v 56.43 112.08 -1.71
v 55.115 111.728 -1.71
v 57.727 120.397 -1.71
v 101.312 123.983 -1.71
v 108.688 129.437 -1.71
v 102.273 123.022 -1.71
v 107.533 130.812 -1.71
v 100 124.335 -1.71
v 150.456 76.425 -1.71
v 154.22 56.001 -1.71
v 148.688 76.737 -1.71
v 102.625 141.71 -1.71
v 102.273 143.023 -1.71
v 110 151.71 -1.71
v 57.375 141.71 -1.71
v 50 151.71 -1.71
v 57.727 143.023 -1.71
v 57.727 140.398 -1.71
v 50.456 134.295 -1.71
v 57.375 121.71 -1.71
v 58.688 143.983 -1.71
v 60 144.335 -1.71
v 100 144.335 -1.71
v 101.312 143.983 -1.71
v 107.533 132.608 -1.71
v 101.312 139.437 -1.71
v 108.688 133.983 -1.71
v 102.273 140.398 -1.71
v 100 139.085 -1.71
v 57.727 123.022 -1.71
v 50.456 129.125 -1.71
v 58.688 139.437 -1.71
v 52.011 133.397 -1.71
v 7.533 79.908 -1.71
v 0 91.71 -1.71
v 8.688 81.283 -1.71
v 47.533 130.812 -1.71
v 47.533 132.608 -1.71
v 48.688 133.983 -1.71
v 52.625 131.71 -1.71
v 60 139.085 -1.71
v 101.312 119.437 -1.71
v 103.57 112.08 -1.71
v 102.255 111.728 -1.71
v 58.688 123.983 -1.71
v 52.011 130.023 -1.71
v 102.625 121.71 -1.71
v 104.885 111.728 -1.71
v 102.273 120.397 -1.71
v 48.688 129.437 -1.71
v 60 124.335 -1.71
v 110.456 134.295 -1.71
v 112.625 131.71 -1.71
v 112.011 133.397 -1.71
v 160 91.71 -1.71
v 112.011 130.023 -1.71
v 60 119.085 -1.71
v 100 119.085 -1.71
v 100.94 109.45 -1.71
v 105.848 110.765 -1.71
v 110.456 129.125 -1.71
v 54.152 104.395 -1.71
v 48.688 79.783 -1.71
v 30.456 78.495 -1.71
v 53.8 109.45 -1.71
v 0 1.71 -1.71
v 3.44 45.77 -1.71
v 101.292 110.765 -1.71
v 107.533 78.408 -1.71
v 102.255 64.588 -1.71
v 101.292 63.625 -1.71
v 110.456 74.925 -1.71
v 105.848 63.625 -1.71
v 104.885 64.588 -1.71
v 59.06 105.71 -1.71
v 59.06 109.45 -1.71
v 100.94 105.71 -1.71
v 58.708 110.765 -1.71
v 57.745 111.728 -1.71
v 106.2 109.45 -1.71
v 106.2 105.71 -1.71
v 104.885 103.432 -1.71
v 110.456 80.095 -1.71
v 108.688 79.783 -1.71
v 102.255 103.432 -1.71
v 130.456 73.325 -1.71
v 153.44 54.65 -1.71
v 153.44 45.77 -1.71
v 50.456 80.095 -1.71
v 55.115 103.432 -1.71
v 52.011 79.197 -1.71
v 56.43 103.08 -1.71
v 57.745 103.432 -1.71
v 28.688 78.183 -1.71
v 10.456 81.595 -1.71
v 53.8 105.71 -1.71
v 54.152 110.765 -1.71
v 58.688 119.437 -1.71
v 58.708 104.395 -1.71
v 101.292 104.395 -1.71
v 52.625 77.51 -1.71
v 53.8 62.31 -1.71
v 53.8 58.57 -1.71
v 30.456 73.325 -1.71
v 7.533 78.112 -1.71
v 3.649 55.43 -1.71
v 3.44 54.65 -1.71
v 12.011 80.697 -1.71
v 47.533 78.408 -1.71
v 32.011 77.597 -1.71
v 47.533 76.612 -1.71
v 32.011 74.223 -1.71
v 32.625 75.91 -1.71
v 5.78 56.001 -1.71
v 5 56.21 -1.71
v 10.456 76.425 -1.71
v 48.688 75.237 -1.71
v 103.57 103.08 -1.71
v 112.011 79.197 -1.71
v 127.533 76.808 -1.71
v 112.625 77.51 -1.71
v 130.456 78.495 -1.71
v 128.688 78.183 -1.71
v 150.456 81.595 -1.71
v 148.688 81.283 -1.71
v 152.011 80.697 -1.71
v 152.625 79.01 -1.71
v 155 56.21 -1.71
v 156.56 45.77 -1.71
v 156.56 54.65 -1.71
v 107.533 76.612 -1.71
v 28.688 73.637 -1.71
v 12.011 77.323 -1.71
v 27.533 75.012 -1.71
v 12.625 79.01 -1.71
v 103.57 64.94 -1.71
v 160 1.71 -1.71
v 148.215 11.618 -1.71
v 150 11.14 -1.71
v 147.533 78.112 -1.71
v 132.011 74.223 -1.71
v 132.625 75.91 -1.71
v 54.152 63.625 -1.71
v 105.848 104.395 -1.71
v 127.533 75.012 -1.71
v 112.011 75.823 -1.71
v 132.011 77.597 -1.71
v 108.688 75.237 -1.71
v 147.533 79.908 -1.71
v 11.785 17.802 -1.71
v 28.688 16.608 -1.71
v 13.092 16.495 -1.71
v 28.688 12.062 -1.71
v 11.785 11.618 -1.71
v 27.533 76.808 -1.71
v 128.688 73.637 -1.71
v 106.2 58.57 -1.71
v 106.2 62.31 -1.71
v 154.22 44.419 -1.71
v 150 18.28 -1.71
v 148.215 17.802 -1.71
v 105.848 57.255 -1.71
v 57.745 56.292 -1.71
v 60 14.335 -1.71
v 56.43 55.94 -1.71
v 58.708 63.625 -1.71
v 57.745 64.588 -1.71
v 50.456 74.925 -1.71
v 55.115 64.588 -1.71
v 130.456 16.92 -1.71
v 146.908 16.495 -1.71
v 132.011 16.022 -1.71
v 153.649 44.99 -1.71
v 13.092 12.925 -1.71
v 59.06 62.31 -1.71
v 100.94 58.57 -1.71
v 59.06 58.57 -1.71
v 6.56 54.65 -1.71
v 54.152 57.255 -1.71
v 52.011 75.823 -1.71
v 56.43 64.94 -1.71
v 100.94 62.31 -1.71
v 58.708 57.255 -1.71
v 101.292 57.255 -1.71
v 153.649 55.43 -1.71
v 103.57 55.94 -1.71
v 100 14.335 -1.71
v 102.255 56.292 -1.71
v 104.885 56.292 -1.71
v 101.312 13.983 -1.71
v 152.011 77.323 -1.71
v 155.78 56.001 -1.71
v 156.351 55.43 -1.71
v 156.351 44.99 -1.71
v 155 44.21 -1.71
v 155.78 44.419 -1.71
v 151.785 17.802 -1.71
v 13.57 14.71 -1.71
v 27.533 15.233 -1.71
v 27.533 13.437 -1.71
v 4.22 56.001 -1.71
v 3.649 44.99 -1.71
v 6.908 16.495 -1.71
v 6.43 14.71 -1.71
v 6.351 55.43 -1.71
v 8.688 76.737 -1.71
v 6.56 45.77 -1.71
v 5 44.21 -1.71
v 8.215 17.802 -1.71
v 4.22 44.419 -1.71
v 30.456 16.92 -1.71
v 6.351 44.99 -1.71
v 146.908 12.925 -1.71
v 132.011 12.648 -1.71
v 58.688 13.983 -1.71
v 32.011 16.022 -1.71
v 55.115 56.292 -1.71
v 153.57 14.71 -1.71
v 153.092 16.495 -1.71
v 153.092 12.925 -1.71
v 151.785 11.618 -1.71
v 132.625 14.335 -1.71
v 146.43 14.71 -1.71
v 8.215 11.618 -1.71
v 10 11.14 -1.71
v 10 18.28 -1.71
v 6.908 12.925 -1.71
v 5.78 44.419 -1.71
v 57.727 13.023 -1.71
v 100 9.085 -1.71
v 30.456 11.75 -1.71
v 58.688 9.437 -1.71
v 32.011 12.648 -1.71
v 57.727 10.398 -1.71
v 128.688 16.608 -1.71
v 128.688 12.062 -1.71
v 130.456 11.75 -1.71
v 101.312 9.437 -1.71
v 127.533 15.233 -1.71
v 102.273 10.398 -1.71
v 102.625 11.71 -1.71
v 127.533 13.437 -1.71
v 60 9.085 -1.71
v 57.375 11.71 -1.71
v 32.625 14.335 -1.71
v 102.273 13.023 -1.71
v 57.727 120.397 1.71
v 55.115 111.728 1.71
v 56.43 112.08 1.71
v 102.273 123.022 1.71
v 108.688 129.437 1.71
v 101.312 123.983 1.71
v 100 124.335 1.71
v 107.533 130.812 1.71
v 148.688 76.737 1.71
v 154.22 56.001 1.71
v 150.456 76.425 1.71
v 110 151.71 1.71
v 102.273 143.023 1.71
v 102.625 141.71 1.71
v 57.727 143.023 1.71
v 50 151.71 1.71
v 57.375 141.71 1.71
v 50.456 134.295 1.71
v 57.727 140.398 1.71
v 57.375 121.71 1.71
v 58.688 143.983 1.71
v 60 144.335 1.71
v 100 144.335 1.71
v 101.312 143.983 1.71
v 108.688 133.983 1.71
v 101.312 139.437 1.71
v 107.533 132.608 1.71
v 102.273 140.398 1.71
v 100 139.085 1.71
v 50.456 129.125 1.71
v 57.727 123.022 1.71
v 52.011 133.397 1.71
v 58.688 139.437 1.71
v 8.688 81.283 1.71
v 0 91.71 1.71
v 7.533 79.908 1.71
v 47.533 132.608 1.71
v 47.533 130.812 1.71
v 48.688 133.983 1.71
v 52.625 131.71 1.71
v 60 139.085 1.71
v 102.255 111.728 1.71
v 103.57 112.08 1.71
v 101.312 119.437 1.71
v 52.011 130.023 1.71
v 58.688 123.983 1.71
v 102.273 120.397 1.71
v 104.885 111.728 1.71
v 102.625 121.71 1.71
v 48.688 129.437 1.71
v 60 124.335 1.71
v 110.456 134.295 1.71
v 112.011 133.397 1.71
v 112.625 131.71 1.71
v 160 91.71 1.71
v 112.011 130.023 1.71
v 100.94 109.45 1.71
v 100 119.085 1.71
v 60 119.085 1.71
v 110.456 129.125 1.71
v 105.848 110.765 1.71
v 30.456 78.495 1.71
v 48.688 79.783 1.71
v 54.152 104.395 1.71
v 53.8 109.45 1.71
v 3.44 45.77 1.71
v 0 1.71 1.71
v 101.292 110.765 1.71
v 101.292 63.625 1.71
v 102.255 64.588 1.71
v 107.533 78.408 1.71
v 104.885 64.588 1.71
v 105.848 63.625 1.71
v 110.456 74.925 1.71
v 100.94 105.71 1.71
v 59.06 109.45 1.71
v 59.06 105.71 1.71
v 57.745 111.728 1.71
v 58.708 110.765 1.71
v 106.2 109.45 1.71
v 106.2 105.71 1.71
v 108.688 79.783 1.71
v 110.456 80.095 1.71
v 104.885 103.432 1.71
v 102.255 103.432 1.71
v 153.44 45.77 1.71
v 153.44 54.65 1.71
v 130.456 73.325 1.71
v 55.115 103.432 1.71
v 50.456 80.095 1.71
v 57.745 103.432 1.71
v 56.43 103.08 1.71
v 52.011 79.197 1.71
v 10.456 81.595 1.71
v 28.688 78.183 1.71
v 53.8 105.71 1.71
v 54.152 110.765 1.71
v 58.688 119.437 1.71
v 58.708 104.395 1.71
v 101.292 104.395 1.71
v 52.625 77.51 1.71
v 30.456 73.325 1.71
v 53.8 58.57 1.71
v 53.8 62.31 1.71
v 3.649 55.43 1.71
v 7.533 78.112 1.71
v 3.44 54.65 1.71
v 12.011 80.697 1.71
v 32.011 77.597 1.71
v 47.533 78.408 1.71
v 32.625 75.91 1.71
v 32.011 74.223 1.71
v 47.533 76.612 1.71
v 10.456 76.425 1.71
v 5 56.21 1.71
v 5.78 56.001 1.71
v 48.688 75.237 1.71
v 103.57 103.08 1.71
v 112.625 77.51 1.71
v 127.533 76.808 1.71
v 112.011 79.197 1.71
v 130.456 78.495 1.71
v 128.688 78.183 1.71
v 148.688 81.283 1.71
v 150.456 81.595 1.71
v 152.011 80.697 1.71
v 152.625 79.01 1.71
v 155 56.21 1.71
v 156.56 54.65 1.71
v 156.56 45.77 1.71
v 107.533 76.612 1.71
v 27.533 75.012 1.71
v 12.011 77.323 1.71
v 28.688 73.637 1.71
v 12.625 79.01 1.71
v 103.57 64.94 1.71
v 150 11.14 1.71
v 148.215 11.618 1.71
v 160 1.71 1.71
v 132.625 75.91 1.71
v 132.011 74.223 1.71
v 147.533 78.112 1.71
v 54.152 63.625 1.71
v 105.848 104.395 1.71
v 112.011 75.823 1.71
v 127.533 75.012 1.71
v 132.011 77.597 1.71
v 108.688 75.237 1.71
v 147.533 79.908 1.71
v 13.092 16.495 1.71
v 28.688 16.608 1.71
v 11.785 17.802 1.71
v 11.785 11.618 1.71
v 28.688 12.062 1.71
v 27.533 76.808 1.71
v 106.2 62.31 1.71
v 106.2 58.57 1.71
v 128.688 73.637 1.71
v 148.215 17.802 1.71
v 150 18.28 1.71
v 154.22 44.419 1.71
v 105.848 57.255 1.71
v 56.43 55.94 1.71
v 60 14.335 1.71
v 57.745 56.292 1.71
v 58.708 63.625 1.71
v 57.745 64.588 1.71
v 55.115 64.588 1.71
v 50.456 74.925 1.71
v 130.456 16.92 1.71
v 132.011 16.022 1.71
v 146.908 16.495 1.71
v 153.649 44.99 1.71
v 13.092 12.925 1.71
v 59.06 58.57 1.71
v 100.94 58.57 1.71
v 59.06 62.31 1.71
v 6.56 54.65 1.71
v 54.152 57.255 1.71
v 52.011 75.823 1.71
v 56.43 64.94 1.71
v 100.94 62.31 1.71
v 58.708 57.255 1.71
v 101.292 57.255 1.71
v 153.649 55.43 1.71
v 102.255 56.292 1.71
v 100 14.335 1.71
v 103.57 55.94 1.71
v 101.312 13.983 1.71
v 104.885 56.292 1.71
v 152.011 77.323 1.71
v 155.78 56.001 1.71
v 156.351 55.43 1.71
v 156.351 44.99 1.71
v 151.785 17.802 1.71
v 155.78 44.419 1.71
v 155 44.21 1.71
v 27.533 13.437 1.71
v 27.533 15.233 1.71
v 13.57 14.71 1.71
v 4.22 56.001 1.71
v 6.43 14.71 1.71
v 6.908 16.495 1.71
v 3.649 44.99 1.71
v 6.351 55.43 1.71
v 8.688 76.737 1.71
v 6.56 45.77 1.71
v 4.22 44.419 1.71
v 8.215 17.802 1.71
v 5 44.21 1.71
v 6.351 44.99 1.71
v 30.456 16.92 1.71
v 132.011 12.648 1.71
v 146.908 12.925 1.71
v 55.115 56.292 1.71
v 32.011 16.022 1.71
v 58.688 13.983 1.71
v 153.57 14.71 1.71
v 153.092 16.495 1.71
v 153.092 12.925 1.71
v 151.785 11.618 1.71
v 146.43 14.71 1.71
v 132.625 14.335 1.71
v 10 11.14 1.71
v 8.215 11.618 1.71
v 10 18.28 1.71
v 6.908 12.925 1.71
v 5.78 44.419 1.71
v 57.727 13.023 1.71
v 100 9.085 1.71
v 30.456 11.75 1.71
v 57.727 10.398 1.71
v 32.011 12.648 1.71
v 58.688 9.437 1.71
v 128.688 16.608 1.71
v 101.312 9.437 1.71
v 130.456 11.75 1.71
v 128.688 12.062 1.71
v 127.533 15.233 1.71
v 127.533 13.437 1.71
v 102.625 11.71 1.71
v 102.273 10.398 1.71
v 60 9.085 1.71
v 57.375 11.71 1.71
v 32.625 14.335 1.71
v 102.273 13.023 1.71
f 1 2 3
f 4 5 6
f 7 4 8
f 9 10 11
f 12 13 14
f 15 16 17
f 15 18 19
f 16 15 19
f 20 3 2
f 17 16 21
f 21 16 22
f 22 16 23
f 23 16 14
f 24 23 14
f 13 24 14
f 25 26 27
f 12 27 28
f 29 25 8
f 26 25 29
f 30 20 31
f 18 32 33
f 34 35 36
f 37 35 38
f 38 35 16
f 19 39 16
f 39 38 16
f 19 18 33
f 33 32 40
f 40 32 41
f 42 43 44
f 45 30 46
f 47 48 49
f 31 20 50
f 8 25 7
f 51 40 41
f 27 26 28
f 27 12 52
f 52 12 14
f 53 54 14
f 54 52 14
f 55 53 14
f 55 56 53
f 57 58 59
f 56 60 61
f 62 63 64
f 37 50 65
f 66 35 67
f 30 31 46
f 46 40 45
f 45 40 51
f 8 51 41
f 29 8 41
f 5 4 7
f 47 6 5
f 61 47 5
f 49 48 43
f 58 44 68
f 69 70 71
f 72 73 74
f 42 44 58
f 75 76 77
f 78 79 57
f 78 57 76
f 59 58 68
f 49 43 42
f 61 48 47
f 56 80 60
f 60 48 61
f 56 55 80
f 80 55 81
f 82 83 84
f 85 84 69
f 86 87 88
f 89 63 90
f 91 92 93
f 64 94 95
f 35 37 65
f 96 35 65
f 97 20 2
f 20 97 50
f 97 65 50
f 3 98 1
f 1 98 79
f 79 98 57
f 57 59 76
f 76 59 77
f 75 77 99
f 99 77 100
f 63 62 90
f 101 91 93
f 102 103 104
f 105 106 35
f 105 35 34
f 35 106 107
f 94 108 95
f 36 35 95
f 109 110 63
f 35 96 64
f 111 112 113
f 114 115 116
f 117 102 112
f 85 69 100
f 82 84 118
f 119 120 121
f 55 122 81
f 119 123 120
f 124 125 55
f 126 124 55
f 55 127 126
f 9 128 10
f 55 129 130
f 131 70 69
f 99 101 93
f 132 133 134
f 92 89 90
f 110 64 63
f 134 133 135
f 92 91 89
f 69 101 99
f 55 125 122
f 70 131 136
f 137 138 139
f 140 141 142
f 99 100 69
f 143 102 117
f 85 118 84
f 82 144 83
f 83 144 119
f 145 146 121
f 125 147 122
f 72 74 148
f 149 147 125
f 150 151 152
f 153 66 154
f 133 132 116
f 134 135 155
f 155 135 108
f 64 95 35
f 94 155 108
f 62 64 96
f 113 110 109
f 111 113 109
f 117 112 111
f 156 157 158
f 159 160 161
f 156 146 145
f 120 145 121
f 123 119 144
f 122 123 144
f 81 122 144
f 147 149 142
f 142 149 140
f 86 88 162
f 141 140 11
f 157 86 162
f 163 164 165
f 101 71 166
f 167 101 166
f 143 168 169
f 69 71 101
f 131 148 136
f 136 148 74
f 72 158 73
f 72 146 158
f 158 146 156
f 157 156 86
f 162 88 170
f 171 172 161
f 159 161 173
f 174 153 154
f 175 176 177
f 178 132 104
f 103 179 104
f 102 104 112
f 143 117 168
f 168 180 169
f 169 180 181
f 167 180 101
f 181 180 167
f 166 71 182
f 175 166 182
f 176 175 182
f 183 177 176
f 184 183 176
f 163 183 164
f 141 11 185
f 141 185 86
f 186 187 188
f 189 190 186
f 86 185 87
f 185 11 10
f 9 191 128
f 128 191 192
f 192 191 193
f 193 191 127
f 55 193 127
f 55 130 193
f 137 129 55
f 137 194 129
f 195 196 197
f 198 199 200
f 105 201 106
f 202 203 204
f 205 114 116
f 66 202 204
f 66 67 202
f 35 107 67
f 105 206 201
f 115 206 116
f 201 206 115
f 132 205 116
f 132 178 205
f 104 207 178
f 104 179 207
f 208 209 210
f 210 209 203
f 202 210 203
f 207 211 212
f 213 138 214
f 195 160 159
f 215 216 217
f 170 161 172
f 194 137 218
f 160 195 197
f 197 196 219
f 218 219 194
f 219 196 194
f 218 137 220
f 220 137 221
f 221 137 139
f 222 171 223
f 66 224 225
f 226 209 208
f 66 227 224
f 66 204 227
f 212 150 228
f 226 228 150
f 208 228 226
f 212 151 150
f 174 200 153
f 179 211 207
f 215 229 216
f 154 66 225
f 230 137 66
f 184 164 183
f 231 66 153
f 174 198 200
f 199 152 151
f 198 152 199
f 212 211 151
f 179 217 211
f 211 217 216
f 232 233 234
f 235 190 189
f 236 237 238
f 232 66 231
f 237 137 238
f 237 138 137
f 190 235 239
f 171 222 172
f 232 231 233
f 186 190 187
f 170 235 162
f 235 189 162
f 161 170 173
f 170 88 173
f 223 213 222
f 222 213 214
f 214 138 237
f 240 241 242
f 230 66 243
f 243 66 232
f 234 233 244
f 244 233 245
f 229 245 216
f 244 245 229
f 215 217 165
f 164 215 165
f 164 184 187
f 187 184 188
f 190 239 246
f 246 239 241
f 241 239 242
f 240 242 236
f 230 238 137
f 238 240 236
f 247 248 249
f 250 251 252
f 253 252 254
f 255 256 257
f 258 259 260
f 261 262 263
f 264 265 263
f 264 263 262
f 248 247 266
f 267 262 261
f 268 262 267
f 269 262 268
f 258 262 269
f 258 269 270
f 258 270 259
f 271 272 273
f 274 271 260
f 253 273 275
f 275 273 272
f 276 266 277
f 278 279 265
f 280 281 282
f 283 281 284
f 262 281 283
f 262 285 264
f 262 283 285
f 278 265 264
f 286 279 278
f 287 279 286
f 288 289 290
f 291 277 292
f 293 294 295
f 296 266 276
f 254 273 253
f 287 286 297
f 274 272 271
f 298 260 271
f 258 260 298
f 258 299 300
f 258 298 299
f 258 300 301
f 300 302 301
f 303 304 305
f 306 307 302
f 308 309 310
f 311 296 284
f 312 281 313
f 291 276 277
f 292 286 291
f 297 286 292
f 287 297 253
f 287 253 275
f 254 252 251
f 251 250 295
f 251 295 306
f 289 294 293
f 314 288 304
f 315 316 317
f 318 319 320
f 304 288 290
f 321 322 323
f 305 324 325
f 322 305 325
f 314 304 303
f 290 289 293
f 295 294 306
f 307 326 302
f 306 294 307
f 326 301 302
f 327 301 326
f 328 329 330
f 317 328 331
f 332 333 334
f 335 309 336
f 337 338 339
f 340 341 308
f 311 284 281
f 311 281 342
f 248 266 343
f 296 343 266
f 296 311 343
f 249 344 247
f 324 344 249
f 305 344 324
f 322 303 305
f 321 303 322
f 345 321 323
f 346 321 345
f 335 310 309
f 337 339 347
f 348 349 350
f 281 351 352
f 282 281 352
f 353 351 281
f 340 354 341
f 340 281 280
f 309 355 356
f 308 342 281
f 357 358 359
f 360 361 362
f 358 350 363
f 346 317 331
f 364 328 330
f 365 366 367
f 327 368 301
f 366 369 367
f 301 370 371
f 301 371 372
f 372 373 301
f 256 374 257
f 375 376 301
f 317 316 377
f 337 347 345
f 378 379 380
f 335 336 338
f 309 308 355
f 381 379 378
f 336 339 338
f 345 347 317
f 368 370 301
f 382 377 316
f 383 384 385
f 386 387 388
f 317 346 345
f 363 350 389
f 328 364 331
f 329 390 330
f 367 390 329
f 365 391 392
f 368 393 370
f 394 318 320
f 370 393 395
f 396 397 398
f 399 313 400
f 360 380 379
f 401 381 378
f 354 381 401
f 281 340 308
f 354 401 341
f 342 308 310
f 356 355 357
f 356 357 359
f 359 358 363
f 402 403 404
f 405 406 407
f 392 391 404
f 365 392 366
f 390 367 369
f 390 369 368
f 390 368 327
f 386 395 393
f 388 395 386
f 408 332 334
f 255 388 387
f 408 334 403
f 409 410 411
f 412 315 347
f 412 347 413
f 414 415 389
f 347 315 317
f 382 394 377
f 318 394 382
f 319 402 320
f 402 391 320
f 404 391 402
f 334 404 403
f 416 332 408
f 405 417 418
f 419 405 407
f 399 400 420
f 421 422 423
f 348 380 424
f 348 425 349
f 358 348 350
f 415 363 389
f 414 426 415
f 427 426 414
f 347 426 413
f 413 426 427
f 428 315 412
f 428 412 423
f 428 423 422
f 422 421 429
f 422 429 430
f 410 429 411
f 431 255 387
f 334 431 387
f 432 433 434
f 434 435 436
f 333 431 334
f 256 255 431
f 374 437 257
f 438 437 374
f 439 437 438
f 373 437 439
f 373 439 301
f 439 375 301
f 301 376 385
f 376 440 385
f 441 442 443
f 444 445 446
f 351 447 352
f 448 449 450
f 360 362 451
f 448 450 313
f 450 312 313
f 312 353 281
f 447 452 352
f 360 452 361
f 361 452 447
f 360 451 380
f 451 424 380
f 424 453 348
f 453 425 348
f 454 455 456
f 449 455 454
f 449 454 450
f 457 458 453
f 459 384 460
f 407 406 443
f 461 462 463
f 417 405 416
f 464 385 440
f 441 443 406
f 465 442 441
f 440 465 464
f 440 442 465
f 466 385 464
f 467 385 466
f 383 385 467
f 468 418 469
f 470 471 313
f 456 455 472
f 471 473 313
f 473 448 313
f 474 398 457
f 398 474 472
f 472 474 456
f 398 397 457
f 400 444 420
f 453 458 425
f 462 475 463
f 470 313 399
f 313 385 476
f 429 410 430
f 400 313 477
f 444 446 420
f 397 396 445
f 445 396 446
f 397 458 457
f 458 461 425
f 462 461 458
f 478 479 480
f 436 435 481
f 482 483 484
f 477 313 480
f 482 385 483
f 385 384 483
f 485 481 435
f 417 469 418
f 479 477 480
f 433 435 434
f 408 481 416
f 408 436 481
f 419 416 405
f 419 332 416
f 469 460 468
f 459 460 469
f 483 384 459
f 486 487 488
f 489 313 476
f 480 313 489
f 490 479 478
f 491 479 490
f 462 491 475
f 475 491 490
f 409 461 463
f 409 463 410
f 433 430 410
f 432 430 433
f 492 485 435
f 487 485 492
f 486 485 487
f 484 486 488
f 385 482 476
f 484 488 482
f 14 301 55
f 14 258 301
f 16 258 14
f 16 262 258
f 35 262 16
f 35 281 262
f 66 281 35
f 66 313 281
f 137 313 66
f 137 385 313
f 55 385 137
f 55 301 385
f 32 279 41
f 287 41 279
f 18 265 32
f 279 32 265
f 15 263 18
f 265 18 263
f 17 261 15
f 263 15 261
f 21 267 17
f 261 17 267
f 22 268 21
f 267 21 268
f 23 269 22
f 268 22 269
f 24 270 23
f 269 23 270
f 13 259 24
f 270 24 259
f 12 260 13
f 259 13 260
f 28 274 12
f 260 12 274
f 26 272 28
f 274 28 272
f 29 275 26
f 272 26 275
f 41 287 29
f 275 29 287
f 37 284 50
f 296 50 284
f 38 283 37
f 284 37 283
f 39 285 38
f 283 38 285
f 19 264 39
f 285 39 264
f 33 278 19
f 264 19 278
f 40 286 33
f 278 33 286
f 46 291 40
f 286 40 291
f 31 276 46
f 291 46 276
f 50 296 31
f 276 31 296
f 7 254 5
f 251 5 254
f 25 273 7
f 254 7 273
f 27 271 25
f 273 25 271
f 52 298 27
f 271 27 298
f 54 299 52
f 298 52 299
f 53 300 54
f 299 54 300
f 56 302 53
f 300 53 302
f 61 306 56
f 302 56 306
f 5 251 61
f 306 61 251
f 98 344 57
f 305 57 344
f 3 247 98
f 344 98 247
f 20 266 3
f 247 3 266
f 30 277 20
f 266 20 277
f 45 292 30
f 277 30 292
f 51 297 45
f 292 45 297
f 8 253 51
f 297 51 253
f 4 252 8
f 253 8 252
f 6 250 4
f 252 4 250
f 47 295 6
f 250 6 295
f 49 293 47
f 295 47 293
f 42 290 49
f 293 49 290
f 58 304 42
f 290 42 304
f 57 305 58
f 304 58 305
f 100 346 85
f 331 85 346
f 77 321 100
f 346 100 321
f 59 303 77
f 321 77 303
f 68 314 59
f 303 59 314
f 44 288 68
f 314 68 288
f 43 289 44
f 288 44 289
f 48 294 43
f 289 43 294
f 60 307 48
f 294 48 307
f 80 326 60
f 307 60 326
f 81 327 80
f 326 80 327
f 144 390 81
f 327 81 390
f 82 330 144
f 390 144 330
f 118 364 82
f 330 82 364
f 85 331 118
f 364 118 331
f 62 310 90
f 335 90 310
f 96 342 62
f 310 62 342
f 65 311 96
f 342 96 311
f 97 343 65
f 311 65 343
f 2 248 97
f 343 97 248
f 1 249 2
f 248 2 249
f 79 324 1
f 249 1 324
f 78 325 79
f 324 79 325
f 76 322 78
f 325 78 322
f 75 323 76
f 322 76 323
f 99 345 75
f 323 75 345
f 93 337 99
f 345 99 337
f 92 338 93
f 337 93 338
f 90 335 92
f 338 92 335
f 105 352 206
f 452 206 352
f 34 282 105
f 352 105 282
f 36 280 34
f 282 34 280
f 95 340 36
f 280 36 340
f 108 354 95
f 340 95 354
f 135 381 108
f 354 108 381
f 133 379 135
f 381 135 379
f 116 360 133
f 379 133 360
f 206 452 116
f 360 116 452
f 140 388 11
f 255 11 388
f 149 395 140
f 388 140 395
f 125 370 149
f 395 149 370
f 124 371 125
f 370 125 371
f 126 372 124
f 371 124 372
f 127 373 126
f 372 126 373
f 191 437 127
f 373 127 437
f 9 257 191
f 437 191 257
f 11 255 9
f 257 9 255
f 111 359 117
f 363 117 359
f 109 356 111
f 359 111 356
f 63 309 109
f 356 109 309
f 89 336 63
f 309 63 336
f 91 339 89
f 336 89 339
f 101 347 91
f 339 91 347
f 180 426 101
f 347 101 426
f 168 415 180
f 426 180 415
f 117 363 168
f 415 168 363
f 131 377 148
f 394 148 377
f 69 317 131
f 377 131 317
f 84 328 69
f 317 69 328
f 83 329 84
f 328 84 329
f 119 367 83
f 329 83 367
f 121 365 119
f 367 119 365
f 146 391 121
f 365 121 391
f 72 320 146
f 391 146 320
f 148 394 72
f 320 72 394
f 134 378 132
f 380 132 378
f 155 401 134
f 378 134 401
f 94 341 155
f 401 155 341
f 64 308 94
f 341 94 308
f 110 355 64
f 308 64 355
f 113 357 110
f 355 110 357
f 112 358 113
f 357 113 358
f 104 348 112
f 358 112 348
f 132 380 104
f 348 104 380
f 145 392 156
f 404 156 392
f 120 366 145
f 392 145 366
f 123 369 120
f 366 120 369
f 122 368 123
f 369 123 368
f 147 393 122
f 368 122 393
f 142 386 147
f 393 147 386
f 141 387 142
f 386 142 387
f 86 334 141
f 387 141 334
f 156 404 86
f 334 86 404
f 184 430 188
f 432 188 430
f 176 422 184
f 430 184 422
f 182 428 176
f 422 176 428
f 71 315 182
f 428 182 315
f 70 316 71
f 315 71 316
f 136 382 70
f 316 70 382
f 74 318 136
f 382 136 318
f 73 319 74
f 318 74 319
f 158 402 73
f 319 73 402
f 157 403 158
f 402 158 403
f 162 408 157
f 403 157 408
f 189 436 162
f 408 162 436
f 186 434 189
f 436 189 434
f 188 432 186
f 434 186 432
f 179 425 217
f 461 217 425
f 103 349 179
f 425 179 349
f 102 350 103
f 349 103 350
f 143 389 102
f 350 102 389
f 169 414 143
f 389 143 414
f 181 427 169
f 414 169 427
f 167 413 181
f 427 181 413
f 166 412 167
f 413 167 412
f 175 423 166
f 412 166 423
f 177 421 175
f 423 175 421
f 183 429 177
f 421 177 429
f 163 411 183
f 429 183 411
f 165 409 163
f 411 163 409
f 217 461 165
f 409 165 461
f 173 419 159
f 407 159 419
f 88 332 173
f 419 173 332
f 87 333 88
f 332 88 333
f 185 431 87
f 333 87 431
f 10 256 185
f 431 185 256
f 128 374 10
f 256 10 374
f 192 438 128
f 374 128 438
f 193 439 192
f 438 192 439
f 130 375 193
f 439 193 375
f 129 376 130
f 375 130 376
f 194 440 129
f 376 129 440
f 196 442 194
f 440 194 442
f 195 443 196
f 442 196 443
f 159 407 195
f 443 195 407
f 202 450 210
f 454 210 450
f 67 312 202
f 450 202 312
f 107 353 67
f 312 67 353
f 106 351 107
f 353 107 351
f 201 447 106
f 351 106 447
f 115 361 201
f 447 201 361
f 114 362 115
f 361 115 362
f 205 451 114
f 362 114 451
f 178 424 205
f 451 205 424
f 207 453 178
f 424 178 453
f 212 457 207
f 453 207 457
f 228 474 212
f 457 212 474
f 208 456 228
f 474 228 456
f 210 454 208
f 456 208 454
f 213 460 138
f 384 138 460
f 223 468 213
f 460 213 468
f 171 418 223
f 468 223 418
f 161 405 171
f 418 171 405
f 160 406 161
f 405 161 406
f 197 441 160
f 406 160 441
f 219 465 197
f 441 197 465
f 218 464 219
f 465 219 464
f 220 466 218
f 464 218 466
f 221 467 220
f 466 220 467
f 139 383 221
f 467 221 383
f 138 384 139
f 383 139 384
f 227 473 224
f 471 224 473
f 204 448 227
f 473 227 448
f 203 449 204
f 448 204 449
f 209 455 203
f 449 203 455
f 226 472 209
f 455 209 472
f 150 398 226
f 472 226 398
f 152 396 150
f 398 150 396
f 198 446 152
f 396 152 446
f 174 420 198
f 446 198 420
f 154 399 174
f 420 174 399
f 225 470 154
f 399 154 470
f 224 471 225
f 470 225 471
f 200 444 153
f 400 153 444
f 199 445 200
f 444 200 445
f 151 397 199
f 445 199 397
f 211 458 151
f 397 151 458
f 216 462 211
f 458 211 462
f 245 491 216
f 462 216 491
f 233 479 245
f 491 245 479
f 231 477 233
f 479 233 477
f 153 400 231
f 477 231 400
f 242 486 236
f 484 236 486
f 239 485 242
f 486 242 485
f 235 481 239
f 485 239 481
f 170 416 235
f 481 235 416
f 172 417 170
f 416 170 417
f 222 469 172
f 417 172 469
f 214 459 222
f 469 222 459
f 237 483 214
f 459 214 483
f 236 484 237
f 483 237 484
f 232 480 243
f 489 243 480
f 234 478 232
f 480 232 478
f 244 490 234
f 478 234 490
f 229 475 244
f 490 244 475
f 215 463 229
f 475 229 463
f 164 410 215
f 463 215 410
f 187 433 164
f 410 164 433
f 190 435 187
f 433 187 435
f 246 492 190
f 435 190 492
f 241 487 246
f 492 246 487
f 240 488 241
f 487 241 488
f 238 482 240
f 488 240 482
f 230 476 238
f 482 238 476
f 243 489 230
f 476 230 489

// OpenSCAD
module _circular_slot(r,l) {
  hull() {
    for (x=[-1,1]) {
      translate([x * (l / 2 - r), 0, 0]) circle(r=r, $fn=12);
    }
  }
}

module carriage_plate_2d() {
  difference() {
    polygon(points=[
      [0,0],
      [160,0],
      [160, 90],
      [110, 150],
      [50, 150],
      [0, 90]
    ]);

    for (x=[10,150]) {
      translate([x, 13, 0]) circle(r=7.14/2);
      translate([x, 77.3, 0]) circle(r=5.25/2);
    }

    for (x=[50,110], y=[75.8,130]) {
      translate([x, y, 0]) circle(r=5.25/2);
    }

    for (y=[10,120,140]) {
      translate([80, y, 0]) 
        _circular_slot(5.25/2, 40 + 5.25);
    }

    for (x=[-1,1]) {
      translate([80 + x * 75, 42.5 + 6, 0]) 
        rotate([0, 0, 90]) 
          _circular_slot(1.56, (54.5 - 42.5));

      for (y=[10+5.25/2,74.2]) {
        translate([80 + x * 50, y, 0]) circle(r=5.25/2);
      }
    }

    // note: lengths of these slots are off
    for (x=[56.43, 103.57], y=[58.73, 105.87]) {
      translate([x, y, 0]) 
        rotate([0, 0, 90]) 
          _circular_slot(2.63, 9);
    }

    // note: no nema17 mounting slots drawn in
    // note: no motor shaft hole drawn in
  }
}

module carriage_plate() {
  color("gray")
  translate([0, 3.42/2, 0]) 
  linear_extrude(height=3.42, center=true)
    carriage_plate_2d();
}

carriage_plate();
